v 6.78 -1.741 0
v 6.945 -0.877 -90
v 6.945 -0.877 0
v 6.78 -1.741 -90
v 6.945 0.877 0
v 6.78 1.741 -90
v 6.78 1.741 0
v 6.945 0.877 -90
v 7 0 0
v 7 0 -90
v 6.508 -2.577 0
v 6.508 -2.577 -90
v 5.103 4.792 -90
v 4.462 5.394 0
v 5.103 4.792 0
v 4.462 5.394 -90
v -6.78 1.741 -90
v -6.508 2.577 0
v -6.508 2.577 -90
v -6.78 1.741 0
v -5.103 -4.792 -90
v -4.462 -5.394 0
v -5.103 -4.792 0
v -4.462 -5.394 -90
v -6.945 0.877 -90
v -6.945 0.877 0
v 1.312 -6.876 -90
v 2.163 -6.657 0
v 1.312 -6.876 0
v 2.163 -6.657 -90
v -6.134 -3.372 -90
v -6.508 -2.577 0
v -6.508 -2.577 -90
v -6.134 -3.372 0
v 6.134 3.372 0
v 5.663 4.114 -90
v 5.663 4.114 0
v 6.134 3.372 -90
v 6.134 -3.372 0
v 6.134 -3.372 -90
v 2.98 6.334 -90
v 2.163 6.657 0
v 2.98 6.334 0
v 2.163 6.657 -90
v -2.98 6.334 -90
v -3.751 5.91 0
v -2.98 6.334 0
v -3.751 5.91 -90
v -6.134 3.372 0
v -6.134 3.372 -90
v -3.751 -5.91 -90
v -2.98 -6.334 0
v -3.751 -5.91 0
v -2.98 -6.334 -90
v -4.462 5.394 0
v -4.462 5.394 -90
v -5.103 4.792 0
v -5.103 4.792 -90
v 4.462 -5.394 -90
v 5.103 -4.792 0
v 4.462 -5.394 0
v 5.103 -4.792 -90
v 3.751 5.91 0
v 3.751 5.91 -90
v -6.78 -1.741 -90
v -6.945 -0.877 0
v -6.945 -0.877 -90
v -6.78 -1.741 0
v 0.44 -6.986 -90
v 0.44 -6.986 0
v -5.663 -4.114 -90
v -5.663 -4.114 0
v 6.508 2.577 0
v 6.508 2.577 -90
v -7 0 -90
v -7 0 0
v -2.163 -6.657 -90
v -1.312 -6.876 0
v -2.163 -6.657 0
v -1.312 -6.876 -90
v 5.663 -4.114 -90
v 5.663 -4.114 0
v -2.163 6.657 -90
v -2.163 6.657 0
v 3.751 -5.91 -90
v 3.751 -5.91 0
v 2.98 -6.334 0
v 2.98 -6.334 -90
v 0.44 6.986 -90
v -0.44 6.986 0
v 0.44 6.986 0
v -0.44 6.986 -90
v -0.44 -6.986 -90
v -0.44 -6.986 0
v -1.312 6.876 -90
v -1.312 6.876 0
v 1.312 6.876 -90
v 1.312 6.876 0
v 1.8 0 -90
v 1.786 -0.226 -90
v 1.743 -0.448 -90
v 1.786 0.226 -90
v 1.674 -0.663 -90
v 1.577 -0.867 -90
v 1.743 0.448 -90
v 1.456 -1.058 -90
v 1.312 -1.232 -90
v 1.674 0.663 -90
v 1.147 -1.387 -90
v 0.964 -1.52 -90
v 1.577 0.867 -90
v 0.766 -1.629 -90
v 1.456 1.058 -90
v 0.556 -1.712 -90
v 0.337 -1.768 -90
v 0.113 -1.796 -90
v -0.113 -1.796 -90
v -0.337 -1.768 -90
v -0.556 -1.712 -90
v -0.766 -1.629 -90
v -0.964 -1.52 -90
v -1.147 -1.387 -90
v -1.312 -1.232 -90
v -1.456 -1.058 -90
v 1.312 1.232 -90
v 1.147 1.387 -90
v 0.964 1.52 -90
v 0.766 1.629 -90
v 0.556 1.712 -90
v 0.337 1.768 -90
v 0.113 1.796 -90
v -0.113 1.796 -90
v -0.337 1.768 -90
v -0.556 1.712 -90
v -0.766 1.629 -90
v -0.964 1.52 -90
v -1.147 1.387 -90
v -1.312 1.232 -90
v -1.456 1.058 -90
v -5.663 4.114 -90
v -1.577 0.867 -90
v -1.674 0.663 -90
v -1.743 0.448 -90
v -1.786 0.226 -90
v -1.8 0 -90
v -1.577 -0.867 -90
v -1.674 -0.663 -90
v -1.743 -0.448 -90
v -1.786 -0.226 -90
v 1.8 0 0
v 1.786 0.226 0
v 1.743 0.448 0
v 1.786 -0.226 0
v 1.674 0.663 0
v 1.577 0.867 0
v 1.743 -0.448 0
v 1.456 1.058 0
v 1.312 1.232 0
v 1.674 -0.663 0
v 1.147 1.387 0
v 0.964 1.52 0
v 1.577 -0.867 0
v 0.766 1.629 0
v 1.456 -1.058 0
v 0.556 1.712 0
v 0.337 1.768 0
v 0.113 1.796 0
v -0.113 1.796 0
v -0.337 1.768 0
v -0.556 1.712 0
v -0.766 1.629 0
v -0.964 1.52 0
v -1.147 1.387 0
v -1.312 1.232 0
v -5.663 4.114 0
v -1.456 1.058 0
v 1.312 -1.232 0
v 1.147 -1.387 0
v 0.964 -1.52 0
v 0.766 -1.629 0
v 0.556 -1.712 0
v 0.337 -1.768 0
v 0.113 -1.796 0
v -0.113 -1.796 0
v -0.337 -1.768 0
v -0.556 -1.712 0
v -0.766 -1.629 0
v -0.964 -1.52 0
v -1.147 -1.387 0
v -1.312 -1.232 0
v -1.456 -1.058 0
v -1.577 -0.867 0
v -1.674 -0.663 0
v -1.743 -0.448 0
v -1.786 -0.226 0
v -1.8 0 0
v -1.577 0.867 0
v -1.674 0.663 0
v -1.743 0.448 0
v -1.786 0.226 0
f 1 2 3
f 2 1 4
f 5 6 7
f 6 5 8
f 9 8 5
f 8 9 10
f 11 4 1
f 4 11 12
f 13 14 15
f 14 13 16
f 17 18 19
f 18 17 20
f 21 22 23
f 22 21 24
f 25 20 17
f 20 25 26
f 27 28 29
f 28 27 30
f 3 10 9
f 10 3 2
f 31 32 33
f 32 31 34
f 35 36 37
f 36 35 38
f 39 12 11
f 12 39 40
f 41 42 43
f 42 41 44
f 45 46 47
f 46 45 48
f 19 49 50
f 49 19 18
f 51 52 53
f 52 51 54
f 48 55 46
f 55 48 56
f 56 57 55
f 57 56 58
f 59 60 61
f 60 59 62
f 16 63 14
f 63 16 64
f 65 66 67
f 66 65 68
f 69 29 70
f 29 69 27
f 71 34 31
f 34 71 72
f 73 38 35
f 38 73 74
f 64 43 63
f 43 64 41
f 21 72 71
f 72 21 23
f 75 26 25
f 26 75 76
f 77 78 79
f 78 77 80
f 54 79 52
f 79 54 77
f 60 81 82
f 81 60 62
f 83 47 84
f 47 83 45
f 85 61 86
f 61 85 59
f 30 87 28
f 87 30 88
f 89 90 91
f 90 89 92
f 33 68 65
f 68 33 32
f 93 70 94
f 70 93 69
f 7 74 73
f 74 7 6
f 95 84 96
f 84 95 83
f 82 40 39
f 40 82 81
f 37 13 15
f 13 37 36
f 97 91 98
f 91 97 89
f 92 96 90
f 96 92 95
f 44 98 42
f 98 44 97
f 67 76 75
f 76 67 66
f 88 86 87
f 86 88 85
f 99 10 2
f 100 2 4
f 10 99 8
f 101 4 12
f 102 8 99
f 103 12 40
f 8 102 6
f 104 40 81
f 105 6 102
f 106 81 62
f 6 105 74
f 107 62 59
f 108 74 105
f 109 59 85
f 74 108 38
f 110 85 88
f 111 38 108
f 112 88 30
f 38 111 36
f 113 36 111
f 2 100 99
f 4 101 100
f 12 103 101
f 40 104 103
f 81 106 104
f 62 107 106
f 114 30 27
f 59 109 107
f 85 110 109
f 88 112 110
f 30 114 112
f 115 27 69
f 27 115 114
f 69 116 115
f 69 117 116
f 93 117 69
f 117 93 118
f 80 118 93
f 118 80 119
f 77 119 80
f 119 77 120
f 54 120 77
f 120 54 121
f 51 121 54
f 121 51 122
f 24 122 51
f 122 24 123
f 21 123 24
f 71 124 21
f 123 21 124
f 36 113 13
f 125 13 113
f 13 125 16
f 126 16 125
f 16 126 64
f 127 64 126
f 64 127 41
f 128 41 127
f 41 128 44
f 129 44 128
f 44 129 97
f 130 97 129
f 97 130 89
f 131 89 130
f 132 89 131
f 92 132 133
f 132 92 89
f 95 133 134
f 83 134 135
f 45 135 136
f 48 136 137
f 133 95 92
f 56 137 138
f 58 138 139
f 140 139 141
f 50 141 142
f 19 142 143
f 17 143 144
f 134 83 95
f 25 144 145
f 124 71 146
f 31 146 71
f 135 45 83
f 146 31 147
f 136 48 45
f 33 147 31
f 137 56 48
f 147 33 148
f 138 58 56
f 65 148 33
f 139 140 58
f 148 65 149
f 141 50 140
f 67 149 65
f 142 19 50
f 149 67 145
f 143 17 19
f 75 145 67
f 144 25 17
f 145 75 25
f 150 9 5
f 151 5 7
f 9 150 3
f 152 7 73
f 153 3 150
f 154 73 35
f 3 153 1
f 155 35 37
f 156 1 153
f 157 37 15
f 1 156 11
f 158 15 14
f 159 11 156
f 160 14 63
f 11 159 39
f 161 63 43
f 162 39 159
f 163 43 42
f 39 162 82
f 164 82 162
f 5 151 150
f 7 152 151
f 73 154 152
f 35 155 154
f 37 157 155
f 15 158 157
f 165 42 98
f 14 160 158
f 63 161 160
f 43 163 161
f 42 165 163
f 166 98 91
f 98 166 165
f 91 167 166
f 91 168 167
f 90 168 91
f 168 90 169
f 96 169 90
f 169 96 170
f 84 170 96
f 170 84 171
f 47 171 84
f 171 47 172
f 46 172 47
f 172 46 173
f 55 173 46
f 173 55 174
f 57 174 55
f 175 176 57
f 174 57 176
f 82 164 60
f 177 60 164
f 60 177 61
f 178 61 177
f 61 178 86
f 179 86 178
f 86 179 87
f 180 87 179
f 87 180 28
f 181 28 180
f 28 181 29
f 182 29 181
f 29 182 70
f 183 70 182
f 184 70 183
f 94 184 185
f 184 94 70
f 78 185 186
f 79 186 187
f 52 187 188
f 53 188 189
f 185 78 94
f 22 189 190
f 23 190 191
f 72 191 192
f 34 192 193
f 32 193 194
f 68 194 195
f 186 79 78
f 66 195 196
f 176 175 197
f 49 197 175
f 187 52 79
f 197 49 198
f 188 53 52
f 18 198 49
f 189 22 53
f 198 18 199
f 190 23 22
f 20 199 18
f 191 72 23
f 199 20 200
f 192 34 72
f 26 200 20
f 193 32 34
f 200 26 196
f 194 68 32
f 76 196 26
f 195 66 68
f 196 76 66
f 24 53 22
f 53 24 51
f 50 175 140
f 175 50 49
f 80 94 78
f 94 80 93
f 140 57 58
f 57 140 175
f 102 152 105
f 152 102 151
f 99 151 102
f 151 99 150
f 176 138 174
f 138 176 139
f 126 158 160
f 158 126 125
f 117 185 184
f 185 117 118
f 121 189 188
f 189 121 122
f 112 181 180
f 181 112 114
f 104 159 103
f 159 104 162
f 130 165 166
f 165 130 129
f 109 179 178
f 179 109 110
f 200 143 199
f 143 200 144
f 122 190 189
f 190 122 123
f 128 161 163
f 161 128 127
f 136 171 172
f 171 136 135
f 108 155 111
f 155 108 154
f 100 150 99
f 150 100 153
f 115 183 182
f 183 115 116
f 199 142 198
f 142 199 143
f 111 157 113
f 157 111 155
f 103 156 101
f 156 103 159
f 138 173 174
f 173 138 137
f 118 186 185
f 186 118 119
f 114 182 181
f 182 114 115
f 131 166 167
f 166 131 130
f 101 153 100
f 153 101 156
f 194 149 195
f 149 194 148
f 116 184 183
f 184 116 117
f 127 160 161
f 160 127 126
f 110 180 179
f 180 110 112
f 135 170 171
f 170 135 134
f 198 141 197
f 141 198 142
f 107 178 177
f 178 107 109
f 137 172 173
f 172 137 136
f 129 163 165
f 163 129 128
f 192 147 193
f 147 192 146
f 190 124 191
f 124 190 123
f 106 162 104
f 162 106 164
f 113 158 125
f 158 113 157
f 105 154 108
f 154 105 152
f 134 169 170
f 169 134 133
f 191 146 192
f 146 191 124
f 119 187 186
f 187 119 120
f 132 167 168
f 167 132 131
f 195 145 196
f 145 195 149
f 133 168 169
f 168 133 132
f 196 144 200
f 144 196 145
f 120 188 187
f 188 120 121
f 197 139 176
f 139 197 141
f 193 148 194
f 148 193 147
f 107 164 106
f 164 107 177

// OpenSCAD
$fn = 50;


difference() {
	union() {
		translate(v = [0, 0, -90.0000000000]) {
			cylinder(h = 90, r = 7.0000000000);
		}
		cylinder(h = 0, r = 10.0000000000);
	}
	union() {
		#translate(v = [0, 0, -90]) {
			cylinder(h = 90, r = 1.8000000000);
		}
	}
}
